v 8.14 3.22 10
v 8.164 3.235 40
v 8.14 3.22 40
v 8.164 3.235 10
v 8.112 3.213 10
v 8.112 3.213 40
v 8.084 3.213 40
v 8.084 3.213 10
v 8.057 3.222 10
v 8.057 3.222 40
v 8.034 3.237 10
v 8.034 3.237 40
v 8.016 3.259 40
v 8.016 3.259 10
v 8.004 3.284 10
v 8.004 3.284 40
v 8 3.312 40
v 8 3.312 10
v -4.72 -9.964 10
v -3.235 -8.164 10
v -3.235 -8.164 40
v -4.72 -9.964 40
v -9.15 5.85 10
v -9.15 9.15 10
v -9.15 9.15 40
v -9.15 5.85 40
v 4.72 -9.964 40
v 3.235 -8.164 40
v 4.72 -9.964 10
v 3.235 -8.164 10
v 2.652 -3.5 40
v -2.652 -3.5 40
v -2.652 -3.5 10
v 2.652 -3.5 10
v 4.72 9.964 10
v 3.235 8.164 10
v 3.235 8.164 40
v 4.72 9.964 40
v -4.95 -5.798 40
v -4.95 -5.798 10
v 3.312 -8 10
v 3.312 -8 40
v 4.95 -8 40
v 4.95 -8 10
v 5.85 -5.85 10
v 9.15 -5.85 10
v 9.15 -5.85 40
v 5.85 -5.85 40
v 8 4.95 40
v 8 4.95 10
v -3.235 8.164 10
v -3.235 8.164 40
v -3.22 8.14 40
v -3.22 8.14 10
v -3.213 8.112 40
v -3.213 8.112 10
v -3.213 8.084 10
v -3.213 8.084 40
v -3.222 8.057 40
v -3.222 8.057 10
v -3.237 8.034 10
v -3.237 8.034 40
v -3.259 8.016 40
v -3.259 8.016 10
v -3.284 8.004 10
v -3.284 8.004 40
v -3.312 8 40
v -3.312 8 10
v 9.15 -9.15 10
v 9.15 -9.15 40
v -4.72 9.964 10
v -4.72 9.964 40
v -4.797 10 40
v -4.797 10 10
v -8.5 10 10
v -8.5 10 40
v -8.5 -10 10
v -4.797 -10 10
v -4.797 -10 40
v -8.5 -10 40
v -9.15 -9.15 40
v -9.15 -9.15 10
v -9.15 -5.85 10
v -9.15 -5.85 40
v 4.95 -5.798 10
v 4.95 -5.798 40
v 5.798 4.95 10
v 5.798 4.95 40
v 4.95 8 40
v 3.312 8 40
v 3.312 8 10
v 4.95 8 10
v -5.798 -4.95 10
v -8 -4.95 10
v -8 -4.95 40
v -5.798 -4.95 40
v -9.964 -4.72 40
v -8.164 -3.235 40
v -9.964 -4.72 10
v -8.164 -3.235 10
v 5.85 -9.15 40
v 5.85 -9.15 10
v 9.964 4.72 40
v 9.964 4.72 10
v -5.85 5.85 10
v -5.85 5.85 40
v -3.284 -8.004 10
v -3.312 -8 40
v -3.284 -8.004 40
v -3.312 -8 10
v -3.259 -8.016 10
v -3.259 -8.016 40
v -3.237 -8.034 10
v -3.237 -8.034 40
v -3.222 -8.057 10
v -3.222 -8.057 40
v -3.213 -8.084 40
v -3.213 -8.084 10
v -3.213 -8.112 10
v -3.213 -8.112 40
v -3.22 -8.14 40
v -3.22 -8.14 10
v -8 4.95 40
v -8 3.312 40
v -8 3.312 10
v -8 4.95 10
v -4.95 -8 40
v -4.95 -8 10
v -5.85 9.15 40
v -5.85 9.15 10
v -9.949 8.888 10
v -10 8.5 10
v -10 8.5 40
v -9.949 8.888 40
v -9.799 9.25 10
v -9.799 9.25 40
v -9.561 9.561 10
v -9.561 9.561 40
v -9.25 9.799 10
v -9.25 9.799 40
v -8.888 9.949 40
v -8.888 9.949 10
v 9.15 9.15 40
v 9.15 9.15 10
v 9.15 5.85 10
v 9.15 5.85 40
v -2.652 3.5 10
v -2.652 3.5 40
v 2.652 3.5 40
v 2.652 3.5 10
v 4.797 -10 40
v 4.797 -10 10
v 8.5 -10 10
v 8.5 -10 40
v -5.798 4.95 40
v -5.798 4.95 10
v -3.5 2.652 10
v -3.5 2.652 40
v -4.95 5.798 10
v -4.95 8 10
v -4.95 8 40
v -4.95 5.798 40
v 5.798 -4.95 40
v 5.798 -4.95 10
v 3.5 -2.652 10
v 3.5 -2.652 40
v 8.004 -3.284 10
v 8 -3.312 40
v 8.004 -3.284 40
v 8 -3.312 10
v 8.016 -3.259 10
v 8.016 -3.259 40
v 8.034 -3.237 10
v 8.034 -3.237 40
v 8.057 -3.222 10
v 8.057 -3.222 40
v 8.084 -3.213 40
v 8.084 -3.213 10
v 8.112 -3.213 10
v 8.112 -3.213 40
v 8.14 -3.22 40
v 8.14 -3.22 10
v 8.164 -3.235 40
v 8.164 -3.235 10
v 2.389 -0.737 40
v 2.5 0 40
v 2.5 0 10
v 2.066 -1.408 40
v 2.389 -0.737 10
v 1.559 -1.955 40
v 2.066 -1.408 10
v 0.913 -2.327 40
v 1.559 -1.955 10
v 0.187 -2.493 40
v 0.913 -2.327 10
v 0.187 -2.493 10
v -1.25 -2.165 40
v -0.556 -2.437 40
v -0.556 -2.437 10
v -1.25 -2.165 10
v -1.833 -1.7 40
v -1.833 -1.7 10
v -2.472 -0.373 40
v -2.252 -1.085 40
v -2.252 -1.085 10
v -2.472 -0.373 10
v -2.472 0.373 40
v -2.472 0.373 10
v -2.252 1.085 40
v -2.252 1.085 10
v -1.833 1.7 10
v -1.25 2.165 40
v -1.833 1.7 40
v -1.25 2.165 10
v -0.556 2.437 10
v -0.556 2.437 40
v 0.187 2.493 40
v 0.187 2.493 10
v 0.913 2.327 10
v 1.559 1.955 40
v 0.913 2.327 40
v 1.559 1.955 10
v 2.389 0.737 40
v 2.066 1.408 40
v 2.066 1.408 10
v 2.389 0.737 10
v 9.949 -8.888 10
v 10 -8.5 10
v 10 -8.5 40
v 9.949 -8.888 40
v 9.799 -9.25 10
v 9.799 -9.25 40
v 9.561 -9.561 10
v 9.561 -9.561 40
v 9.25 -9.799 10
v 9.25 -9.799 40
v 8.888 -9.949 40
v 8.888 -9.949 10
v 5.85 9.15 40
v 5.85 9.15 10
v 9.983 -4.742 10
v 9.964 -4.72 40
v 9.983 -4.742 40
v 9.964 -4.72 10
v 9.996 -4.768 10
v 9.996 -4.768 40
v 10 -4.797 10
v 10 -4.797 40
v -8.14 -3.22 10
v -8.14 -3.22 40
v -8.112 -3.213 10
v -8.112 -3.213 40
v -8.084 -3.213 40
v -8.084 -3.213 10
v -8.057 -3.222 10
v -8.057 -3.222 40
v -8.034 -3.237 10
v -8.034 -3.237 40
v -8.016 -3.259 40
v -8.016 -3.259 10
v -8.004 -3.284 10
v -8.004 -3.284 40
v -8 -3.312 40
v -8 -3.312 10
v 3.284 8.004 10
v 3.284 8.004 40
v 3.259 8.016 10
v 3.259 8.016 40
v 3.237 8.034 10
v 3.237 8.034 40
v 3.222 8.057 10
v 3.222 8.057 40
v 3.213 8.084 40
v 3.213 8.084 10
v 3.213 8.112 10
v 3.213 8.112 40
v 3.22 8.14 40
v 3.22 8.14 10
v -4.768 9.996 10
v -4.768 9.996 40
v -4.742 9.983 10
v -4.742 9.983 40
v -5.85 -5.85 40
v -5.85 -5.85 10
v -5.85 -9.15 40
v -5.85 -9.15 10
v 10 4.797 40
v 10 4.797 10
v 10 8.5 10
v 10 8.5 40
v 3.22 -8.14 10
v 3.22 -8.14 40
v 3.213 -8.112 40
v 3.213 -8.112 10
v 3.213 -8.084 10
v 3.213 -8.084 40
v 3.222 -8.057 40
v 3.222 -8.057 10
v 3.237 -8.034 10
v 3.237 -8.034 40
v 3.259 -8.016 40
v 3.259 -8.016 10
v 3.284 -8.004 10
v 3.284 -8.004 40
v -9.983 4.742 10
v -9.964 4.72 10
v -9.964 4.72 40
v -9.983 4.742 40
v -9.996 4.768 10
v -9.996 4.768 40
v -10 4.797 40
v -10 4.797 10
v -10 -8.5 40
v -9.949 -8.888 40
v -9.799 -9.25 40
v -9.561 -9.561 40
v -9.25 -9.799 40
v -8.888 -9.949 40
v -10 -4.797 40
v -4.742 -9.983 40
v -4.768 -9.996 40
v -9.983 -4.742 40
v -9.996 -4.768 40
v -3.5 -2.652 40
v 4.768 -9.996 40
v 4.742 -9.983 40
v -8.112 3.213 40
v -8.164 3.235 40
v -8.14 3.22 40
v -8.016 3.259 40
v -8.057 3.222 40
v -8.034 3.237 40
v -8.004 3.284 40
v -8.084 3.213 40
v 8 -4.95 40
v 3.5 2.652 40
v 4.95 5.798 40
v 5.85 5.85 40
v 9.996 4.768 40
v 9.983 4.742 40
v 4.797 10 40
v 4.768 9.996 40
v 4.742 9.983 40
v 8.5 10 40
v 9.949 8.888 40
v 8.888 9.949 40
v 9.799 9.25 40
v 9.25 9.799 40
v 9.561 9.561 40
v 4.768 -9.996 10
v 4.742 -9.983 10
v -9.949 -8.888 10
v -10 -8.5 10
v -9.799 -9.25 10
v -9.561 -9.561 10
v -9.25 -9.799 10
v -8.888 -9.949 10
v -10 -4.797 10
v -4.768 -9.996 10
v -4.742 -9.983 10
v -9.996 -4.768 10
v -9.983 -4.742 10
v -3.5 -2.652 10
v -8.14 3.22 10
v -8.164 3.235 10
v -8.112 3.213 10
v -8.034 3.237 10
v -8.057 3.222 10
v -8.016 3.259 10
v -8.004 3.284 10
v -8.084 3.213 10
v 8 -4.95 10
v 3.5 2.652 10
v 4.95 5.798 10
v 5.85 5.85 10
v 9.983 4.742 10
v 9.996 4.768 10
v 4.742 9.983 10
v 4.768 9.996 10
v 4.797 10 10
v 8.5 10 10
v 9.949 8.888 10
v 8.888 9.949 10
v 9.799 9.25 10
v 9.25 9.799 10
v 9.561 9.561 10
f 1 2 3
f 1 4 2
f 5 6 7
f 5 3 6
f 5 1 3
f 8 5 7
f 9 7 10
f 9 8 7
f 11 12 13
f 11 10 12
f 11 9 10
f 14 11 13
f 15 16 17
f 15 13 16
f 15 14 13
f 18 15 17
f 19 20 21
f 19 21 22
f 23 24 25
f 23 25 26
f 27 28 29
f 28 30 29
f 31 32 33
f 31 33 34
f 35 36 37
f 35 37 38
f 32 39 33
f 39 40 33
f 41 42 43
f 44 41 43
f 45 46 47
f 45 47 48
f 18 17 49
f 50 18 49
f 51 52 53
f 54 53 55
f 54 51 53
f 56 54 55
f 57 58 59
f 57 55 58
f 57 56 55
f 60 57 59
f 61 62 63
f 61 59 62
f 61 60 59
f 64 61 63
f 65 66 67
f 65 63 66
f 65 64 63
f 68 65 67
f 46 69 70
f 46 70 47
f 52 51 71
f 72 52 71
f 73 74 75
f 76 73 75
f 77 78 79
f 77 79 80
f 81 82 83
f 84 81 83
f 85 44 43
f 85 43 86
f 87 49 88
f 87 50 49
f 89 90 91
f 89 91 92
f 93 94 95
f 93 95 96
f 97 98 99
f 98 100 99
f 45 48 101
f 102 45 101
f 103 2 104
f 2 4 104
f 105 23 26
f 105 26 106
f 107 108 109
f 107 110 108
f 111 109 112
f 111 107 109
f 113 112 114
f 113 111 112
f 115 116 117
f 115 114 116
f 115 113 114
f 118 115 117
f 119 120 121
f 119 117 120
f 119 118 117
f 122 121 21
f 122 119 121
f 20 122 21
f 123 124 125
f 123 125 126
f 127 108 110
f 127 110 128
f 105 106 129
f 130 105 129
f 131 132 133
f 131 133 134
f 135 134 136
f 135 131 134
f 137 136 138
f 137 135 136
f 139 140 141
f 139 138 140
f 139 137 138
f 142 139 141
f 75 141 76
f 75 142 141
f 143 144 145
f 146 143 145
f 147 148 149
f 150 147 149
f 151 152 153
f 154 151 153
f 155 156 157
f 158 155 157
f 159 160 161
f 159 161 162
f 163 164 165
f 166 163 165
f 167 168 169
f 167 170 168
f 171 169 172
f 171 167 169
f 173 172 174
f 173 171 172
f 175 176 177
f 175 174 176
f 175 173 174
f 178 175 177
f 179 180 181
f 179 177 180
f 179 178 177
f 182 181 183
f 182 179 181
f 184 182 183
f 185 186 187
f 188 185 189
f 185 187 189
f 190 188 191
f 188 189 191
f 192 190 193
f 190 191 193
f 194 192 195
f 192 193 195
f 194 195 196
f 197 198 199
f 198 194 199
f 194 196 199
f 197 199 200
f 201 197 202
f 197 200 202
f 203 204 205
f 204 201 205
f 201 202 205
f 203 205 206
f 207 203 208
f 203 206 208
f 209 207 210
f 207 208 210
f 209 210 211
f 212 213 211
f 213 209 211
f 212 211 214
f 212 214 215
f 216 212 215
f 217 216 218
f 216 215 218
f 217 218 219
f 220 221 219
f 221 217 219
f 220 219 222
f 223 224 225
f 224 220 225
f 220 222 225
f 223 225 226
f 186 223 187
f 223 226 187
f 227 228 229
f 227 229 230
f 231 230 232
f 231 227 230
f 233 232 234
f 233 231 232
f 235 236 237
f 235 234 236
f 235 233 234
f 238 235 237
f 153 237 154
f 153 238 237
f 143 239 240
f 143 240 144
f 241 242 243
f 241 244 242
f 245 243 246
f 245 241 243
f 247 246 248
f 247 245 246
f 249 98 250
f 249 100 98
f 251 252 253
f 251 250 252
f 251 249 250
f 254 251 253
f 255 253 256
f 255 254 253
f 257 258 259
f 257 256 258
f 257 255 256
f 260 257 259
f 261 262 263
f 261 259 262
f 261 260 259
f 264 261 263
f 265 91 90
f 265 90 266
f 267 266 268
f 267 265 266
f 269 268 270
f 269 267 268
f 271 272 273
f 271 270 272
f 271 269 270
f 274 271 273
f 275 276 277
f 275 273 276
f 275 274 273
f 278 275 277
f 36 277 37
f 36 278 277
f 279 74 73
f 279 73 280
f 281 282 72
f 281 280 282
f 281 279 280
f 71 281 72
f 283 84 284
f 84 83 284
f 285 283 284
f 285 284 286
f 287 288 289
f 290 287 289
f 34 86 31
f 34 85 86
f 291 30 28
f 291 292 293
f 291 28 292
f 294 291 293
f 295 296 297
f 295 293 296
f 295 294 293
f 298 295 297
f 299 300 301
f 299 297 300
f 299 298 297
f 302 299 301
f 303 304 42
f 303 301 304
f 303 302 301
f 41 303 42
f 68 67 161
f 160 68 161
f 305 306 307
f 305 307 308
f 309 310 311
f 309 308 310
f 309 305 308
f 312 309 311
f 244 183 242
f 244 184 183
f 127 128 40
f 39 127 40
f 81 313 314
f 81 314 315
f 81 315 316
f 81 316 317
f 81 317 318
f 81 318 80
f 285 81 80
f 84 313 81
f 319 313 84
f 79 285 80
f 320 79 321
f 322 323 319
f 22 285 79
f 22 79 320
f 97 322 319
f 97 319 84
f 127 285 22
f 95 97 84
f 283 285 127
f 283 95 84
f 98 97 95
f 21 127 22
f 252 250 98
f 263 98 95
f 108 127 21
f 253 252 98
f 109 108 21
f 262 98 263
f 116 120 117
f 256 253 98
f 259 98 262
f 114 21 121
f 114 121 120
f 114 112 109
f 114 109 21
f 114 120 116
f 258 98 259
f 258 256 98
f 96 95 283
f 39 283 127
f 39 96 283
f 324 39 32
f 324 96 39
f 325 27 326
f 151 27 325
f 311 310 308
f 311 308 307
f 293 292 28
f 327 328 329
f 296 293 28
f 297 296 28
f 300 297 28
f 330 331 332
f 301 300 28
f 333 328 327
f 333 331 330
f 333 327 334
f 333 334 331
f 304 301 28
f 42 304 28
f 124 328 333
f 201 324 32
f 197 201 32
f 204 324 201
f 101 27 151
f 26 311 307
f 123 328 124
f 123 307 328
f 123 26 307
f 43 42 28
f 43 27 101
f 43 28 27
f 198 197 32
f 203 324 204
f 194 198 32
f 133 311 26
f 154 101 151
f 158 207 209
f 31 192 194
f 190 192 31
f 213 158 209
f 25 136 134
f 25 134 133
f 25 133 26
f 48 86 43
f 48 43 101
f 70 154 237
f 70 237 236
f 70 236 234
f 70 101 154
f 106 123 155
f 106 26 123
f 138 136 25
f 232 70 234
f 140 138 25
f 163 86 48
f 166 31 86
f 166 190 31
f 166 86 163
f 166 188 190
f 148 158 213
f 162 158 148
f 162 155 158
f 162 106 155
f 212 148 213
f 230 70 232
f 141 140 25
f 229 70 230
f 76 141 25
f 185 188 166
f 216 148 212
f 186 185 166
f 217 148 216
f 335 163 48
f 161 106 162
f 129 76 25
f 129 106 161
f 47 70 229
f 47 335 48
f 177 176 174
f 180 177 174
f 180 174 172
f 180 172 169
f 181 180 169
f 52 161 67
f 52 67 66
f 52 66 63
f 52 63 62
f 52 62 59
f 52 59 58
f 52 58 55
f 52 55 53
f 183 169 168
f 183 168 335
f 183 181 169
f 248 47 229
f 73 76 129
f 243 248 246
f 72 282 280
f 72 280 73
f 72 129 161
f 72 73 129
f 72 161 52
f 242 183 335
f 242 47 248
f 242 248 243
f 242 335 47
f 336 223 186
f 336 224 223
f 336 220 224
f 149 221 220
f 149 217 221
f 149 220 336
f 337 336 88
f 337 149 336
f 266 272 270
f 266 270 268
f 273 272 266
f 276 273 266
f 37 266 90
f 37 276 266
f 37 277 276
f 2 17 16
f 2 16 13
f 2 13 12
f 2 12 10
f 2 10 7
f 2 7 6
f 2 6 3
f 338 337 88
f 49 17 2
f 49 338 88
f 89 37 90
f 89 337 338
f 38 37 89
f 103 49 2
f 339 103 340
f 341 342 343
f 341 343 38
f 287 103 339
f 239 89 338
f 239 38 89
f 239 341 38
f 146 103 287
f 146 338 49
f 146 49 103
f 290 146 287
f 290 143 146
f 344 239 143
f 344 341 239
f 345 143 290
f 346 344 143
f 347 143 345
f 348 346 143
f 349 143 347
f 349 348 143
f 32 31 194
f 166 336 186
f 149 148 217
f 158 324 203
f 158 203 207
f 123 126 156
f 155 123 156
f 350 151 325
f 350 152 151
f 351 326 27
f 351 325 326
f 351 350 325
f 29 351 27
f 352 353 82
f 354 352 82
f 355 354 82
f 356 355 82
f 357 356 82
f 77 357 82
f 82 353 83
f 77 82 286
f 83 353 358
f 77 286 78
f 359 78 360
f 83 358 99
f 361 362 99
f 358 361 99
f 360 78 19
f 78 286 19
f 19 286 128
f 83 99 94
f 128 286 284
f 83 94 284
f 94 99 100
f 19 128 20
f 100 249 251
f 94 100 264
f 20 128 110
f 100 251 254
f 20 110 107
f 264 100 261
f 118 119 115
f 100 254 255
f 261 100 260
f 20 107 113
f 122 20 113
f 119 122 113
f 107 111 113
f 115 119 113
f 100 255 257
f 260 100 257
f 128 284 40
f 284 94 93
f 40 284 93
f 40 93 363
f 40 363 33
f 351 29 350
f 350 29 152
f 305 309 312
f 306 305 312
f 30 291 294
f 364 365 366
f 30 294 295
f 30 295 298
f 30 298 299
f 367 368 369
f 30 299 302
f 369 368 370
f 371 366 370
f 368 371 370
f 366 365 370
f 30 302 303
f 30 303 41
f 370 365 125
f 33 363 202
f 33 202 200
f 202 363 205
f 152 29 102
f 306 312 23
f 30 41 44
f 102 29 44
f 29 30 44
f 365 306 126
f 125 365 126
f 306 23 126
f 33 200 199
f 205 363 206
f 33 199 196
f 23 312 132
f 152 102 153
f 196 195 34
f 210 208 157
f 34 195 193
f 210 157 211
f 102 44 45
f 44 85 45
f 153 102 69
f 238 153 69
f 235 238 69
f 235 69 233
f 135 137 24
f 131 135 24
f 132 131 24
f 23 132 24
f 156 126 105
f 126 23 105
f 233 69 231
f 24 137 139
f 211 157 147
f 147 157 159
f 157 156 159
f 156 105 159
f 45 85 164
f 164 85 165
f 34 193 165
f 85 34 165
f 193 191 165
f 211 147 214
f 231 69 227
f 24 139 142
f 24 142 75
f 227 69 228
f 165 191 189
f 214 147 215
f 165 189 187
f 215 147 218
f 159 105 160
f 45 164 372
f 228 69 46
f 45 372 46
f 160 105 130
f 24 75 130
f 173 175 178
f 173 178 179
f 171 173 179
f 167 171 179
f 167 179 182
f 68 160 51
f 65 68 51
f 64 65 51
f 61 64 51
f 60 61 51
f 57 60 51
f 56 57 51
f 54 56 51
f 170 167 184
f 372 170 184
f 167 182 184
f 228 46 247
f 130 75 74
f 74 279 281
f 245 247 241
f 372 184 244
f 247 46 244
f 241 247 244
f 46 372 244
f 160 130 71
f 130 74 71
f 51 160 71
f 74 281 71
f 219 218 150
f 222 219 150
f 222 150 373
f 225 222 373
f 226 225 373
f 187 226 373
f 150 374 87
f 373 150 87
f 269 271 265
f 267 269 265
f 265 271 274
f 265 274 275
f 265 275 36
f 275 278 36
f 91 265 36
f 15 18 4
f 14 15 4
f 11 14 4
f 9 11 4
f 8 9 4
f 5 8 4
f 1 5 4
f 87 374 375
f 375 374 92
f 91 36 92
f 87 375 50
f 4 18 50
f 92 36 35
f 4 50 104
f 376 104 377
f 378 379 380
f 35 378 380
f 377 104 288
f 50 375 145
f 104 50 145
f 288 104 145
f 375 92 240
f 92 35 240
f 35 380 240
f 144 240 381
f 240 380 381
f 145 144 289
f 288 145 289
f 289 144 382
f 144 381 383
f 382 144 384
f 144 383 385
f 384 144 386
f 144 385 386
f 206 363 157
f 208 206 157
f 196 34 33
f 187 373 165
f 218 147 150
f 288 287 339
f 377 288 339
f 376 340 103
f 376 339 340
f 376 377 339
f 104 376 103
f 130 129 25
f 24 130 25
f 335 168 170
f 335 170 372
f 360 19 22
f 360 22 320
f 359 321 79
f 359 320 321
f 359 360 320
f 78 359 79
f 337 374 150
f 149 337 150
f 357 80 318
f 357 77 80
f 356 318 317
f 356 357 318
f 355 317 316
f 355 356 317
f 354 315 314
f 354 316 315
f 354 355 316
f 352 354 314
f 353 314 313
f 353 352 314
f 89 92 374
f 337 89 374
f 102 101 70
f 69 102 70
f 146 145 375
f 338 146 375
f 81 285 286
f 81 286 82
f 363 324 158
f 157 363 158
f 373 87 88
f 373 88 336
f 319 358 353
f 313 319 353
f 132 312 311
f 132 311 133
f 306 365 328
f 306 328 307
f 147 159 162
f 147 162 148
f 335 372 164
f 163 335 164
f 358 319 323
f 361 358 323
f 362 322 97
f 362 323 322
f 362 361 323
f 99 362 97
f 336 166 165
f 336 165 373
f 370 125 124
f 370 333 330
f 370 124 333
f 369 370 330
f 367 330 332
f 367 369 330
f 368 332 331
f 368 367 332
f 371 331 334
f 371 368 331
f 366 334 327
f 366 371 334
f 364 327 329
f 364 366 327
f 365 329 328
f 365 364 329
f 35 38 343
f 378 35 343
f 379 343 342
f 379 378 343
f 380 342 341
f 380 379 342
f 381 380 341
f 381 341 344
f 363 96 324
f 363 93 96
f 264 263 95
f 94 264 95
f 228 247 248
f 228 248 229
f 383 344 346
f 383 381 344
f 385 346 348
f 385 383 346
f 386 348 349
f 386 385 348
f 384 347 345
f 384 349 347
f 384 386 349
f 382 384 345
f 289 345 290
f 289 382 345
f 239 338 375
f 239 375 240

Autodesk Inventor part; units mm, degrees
ref_plane "Начальная плоскость" through (0, 0, 10) normal (0, 0, 1) x (1, 0, 0)
ref_plane "Конечная плоскость" through (0, 0, 40) normal (0, 0, 1) x (1, 0, 0)
sketch "Эскиз" plane through (0, 0, 0) normal (0, 0, 1) x (1, 0, 0)
  line L0 (-14.4349, 0) -> (14.4349, 0) projected
  line L1 (0, -14) -> (0, 14) projected
  line L2 (0, 0) -> (7.5, 7.5) construction
  circle A0 centre (7.5, 7.5) radius 1.65 construction
  line L3 (5.85, 9.15) -> (9.15, 9.15)
  line L4 (9.15, 9.15) -> (9.15, 5.85)
  line L5 (9.15, 5.85) -> (5.85, 5.85)
  line L6 (5.85, 5.85) -> (5.85, 9.15)
  line L7 (3.235, 8.1636) -> (4.72, 9.9636)
  line L8 (4.7971, 10) -> (8.5, 10)
  line L9 (3.3121, 8) -> (4.95, 8)
  line L10 (4.95, 8) -> (4.95, 5.7985)
  line L11 (4.95, 5.7985) -> (2.6515, 3.5)
  line L12 (0, 3.5) -> (2.6515, 3.5)
  circle A1 centre (0, 0) radius 2.5
  line L13 (8.1636, 3.235) -> (9.9636, 4.72)
  line L14 (10, 4.7971) -> (10, 8.5)
  line L15 (8, 3.3121) -> (8, 4.95)
  line L16 (8, 4.95) -> (5.7985, 4.95)
  line L17 (5.7985, 4.95) -> (3.5, 2.6515)
  line L18 (3.5, 0) -> (3.5, 2.6515)
  arc A2 (10, 8.5) -> (8.5, 10) centre (8.5, 8.5) ccw
  line L19 (0, 0) -> (-7.5, 7.5) construction
  circle A3 centre (-7.5, 7.5) radius 1.65 construction
  line L20 (-5.85, 9.15) -> (-9.15, 9.15)
  line L21 (-9.15, 9.15) -> (-9.15, 5.85)
  line L22 (-9.15, 5.85) -> (-5.85, 5.85)
  line L23 (-5.85, 5.85) -> (-5.85, 9.15)
  line L24 (-3.235, 8.1636) -> (-4.72, 9.9636)
  line L25 (-4.7971, 10) -> (-8.5, 10)
  line L26 (-3.3121, 8) -> (-4.95, 8)
  line L27 (-4.95, 8) -> (-4.95, 5.7985)
  line L28 (-4.95, 5.7985) -> (-2.6515, 3.5)
  line L29 (0, 3.5) -> (-2.6515, 3.5)
  line L30 (-3.5, 0) -> (-3.5, 2.6515)
  line L31 (-5.7985, 4.95) -> (-3.5, 2.6515)
  line L32 (-8, 4.95) -> (-5.7985, 4.95)
  line L33 (-8, 3.3121) -> (-8, 4.95)
  line L34 (-8.1636, 3.235) -> (-9.9636, 4.72)
  line L35 (-10, 4.7971) -> (-10, 8.5)
  arc A4 (-8.5, 10) -> (-10, 8.5) centre (-8.5, 8.5) ccw
  line L36 (0, 14) -> (0, -14)
  line L37 (0, 0) -> (7.5, -7.5) construction
  circle A5 centre (7.5, -7.5) radius 1.65 construction
  line L38 (5.85, -9.15) -> (9.15, -9.15)
  line L39 (9.15, -9.15) -> (9.15, -5.85)
  line L40 (9.15, -5.85) -> (5.85, -5.85)
  line L41 (5.85, -5.85) -> (5.85, -9.15)
  line L42 (3.235, -8.1636) -> (4.72, -9.9636)
  line L43 (4.7971, -10) -> (8.5, -10)
  line L44 (3.3121, -8) -> (4.95, -8)
  line L45 (4.95, -8) -> (4.95, -5.7985)
  line L46 (4.95, -5.7985) -> (2.6515, -3.5)
  line L47 (0, -3.5) -> (2.6515, -3.5)
  line L48 (3.5, 0) -> (3.5, -2.6515)
  line L49 (5.7985, -4.95) -> (3.5, -2.6515)
  line L50 (8, -4.95) -> (5.7985, -4.95)
  line L51 (8, -3.3121) -> (8, -4.95)
  line L52 (8.1636, -3.235) -> (9.9636, -4.72)
  line L53 (10, -4.7971) -> (10, -8.5)
  arc A6 (8.5, -10) -> (10, -8.5) centre (8.5, -8.5) ccw
  line L54 (0, 0) -> (-7.5, -7.5) construction
  line L55 (-4.95, -8) -> (-4.95, -5.7985)
  line L56 (-3.3121, -8) -> (-4.95, -8)
  line L57 (-5.7985, -4.95) -> (-3.5, -2.6515)
  line L58 (-4.95, -5.7985) -> (-2.6515, -3.5)
  line L59 (-3.5, 0) -> (-3.5, -2.6515)
  line L60 (0, -3.5) -> (-2.6515, -3.5)
  circle A7 centre (-7.5, -7.5) radius 1.65 construction
  line L61 (-5.85, -5.85) -> (-5.85, -9.15)
  line L62 (-5.85, -9.15) -> (-9.15, -9.15)
  line L63 (-9.15, -9.15) -> (-9.15, -5.85)
  line L64 (-9.15, -5.85) -> (-5.85, -5.85)
  line L65 (-3.235, -8.1636) -> (-4.72, -9.9636)
  line L66 (-8, -4.95) -> (-5.7985, -4.95)
  line L67 (-8, -3.3121) -> (-8, -4.95)
  line L68 (-8.1636, -3.235) -> (-9.9636, -4.72)
  line L69 (-4.7971, -10) -> (-8.5, -10)
  line L70 (-10, -4.7971) -> (-10, -8.5)
  arc A8 (-10, -8.5) -> (-8.5, -10) centre (-8.5, -8.5) ccw
  arc A9 (3.235, 8.1636) -> (3.3121, 8) centre (3.3121, 8.1) ccw
  arc A10 (4.7971, 10) -> (4.72, 9.9636) centre (4.7971, 9.9) ccw
  arc A11 (8, 3.3121) -> (8.1636, 3.235) centre (8.1, 3.3121) ccw
  arc A12 (9.9636, 4.72) -> (10, 4.7971) centre (9.9, 4.7971) ccw
  arc A13 (-3.3121, 8) -> (-3.235, 8.1636) centre (-3.3121, 8.1) ccw
  arc A14 (-4.72, 9.9636) -> (-4.7971, 10) centre (-4.7971, 9.9) ccw
  arc A15 (-8.1636, 3.235) -> (-8, 3.3121) centre (-8.1, 3.3121) ccw
  arc A16 (-10, 4.7971) -> (-9.9636, 4.72) centre (-9.9, 4.7971) ccw
  arc A17 (-8, -3.3121) -> (-8.1636, -3.235) centre (-8.1, -3.3121) ccw
  arc A18 (-9.9636, -4.72) -> (-10, -4.7971) centre (-9.9, -4.7971) ccw
  arc A19 (-3.235, -8.1636) -> (-3.3121, -8) centre (-3.3121, -8.1) ccw
  arc A20 (-4.7971, -10) -> (-4.72, -9.9636) centre (-4.7971, -9.9) ccw
  arc A21 (4.72, -9.9636) -> (4.7971, -10) centre (4.7971, -9.9) ccw
  arc A22 (3.3121, -8) -> (3.235, -8.1636) centre (3.3121, -8.1) ccw
  arc A23 (8.1636, -3.235) -> (8, -3.3121) centre (8.1, -3.3121) ccw
  arc A24 (10, -4.7971) -> (9.9636, -4.72) centre (9.9, -4.7971) ccw
  point P0 (3.1, 8)
  point P1 (4.75, 10)
  point P2 (7.5, 9.15)
  point P3 (8, 3.1)
  point P4 (10, 4.75)
  point P5 (7.5, 5.85)
  point P6 (9.15, 7.5)
  point P7 (-3.1, 8)
  point P8 (-4.75, 10)
  point P9 (-7.5, 9.15)
  point P10 (-8, 3.1)
  point P11 (-10, 4.75)
  point P12 (-7.5, 5.85)
  point P13 (-9.15, 7.5)
  point P14 (3.1, -8)
  point P15 (4.75, -10)
  point P16 (7.5, -9.15)
  point P17 (8, -3.1)
  point P18 (10, -4.75)
  point P19 (7.5, -5.85)
  point P20 (9.15, -7.5)
  point P21 (-3.1, -8)
  point P22 (-7.5, -5.85)
  point P23 (-7.5, -9.15)
  point P24 (-9.15, -7.5)
  point P25 (-4.75, -10)
  point P26 (-8, -3.1)
  point P27 (-10, -4.75)
  dimension "d0" = 45
  dimension "d1" = 3.3
  dimension "d2" = 1.5
  dimension "d3" = 1.2
  dimension "d4" = 5
  dimension "d5" = 6.5
  dimension "d6" = 15
  dimension "d7" = 20
  dimension "d8" = 9.9
  dimension "d9" = 9.5
  dimension "d10" = 6.2
  dimension "d11" = 2
  dimension "d18" = 0.1
  dimension "d19" = 0.1
extrude "Тело" add sketch "Эскиз" along normal up to surface (30 mm away) from surface at 10 contours A1 L1 L12 L11 L10 L9 A9 L7 A10 L8 A2 L14 A12 L13 A11 L15 L16 L17 L18 L0 | L0 L48 L49 L50 L51 A23 L52 A24 L53 A6 L43 A21 L42 A22 L44 L45 L46 L47 L1 A1 | A1 L0 L30 L31 L32 L33 A15 L34 A16 L35 A4 L25 A14 L24 A13 L26 L27 L28 L29 L1 | L1 L60 L58 L55 L56 A19 L65 A20 L69 A8 L70 A18 L68 A17 L67 L66 L57 L59 L0 A1
sketch "Эскиз2" plane through (0, 0, 0) normal (0, 0, 1) x (1, 0, 0)
  line L0 (0, 0) -> (10, 0)
ref_plane "РабПлоскость3" through (0, 0, 0) normal (0, -1, 0) x (1, 0, 0)
sketch "Эскиз3" plane through (0, 0, 0) normal (0, -1, 0) x (1, 0, 0)
  line L0 (-2, 10) -> (12, 10)
  line L1 (-2, 40) -> (12, 40)
  dimension "d25" = 30
ref_plane "РабПлоскость6" through (0, 0, 40) normal (0, 0, 1) x (1, 0, 0)
split "Разделение3" plane through (0, 0, 40) removes the side toward (0, 0, 1)
ref_plane "РабПлоскость7" through (0, 300, 10) normal (0, 0, -1) x (-1, 0, 0)
split "Разделение4" plane through (0, 300, 10) removes the side toward (0, 0, -1)
properties part number "короткая палка"
